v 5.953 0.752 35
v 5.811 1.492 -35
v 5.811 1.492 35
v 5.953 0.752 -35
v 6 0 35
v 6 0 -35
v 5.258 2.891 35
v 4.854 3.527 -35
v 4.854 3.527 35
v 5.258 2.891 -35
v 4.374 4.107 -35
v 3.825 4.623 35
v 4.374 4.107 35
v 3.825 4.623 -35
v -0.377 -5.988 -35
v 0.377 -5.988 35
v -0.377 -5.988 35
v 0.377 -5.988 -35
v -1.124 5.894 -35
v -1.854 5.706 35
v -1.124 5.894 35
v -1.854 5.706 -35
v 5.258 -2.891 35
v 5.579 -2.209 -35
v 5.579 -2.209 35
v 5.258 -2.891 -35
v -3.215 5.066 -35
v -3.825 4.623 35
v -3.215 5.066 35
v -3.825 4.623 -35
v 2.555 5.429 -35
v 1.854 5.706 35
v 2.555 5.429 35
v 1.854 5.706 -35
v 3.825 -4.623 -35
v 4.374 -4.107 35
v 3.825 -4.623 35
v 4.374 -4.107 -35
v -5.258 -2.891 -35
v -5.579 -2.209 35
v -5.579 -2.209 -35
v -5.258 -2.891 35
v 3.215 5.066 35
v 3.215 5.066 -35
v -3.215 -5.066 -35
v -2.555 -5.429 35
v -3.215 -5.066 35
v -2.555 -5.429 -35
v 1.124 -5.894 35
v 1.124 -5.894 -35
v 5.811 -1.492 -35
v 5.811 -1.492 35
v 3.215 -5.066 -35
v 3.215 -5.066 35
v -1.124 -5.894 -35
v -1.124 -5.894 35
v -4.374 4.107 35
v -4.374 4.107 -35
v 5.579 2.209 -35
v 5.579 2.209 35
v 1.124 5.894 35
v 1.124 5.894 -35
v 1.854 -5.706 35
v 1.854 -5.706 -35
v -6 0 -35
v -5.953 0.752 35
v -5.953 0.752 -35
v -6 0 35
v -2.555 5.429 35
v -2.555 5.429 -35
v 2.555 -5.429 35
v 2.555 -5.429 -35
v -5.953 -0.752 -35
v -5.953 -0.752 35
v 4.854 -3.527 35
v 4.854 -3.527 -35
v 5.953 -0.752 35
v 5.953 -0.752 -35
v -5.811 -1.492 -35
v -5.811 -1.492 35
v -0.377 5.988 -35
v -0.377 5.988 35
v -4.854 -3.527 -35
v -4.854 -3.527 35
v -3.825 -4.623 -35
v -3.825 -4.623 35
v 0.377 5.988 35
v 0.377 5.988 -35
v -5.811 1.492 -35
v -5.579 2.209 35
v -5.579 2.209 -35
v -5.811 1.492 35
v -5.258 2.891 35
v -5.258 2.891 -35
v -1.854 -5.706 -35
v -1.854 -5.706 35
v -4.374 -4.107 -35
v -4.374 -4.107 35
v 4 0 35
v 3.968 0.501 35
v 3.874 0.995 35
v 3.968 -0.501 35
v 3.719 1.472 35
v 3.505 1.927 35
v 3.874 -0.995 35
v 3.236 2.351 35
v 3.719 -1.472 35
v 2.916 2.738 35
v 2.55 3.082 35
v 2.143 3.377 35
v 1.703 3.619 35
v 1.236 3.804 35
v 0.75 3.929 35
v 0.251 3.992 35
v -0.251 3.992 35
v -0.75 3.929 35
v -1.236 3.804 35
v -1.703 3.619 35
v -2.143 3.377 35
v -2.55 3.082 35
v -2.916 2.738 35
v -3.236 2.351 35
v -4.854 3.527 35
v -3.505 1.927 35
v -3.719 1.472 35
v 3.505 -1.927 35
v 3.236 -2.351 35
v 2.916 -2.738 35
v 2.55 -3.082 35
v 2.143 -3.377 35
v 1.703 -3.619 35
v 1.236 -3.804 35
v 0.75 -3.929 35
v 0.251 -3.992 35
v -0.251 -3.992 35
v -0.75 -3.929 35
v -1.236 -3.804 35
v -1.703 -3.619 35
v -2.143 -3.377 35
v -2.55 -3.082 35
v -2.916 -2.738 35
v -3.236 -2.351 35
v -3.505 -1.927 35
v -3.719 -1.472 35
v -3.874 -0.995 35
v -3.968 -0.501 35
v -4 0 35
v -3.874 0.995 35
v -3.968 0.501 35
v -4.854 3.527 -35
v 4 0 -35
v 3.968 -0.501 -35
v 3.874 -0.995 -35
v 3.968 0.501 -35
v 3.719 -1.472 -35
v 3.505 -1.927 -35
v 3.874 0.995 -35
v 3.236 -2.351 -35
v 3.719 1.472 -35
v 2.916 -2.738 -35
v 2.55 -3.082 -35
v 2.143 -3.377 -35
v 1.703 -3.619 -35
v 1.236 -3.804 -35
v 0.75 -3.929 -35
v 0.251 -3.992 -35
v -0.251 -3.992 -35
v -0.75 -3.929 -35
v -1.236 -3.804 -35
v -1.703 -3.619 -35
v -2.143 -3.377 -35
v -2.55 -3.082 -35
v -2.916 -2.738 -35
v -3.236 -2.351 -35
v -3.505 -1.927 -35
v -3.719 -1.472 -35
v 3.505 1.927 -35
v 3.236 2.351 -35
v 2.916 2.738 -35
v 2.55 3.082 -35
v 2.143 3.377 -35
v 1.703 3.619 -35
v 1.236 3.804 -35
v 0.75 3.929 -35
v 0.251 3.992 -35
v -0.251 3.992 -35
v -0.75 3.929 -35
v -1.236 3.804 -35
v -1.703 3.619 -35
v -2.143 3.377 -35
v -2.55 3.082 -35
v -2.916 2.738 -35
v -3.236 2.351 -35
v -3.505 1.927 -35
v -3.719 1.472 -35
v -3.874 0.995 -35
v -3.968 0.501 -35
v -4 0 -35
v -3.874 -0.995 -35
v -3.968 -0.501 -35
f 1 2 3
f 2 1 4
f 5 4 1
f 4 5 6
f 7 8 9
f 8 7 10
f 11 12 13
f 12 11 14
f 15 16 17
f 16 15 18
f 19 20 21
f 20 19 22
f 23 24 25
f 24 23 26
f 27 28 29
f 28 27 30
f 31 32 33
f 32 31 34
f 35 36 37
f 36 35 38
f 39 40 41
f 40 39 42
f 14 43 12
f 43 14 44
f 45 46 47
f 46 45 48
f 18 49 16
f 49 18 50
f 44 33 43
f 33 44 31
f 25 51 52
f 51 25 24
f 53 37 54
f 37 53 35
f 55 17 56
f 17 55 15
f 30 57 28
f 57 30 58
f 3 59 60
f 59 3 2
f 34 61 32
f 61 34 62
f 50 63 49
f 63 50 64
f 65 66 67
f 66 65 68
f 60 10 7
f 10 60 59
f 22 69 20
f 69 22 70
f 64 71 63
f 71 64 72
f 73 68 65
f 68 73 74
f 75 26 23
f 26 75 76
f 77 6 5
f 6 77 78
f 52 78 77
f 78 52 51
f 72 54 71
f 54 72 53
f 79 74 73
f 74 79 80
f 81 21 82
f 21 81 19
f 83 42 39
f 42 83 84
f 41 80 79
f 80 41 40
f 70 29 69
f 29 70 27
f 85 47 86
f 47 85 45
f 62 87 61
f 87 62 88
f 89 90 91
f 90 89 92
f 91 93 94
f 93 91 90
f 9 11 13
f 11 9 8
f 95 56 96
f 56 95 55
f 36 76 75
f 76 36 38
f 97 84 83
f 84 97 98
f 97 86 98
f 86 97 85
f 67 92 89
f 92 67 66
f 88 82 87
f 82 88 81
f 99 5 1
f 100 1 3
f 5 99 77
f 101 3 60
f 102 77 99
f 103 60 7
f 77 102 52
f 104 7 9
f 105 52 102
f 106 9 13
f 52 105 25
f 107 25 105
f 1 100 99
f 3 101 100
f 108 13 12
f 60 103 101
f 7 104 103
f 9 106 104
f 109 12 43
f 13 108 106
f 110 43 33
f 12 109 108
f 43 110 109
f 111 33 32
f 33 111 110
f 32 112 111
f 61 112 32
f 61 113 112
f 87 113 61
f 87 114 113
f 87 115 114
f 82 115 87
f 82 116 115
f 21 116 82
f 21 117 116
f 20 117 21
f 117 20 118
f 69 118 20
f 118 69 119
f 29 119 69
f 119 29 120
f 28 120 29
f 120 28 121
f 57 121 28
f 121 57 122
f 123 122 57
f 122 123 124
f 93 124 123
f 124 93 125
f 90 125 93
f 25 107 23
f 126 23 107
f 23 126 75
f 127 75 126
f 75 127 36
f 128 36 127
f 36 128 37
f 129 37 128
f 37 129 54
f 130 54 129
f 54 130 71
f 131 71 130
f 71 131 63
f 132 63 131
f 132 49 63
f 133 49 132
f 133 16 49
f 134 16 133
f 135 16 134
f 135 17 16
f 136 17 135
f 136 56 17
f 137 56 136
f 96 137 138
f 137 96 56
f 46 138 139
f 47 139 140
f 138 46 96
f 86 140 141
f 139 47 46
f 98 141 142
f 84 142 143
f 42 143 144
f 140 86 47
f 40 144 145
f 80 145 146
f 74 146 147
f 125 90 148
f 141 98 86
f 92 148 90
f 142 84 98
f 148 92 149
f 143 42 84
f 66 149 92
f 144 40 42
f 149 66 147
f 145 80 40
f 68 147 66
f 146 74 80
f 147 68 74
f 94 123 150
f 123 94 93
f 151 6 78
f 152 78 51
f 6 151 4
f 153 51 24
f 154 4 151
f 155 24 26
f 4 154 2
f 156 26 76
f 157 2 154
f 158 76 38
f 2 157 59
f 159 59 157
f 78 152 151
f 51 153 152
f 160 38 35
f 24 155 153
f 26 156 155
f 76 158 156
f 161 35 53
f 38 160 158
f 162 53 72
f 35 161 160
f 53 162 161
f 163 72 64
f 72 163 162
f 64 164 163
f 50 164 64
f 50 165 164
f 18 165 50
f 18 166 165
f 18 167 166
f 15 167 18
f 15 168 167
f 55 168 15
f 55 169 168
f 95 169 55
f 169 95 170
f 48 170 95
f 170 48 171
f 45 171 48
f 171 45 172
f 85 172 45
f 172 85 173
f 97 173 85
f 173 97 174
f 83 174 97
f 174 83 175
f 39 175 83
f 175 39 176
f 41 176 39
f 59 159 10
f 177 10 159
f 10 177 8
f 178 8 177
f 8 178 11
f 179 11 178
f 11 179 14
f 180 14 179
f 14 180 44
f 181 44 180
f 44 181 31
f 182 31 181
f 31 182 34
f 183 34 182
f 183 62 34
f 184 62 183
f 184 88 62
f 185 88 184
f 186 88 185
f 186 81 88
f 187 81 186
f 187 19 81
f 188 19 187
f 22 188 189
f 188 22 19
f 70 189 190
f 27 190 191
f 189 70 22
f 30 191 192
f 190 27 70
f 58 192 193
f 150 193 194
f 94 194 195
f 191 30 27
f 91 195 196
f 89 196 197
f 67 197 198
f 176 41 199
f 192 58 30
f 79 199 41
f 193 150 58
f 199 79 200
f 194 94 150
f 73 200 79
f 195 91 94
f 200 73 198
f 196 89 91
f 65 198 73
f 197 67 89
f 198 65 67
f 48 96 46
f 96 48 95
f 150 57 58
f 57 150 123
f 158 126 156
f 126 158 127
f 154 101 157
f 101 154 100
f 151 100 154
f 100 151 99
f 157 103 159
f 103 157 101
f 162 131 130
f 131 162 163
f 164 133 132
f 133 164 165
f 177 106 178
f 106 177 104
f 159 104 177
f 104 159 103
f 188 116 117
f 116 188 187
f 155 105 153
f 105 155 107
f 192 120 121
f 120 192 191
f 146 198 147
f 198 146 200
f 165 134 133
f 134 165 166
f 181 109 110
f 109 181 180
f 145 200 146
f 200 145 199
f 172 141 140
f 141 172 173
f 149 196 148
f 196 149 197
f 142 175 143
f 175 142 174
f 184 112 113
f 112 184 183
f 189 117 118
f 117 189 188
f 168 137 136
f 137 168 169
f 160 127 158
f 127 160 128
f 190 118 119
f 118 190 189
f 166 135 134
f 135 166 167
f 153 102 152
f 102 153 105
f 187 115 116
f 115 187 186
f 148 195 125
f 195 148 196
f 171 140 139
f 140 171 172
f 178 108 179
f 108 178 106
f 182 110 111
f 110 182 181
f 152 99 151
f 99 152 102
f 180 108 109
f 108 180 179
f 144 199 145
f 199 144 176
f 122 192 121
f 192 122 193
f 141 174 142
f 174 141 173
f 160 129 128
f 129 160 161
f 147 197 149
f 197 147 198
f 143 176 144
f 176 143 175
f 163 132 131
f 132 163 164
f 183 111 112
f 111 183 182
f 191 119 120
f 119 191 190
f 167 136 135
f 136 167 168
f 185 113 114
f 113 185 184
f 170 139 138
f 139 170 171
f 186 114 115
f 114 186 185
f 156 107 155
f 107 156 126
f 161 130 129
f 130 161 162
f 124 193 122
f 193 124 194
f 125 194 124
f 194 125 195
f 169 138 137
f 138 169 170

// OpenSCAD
$fn = 50;


difference() {
	union() {
		translate(v = [0, 0, -35.0000000000]) {
			cylinder(h = 70, r = 6.0000000000);
		}
	}
	union() {
		translate(v = [0, 0, -100.0000000000]) {
			cylinder(h = 200, r = 4.0000000000);
		}
	}
}
